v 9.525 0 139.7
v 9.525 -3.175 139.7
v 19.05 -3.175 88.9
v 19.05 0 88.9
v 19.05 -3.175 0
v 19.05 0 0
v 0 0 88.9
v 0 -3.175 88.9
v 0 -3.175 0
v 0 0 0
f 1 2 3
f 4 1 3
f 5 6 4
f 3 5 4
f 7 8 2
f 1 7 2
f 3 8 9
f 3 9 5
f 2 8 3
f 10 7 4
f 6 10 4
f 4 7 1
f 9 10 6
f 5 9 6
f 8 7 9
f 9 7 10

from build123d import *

# Parameters (mm, degrees)
F1_DEPTH = 3.175
F3_DEPTH = 25.4


# Not quite as in the source:
# - a length typed as a fraction of an inch, garbled in the dataset ("3 / 203.2 mm" for 3/8 in), is restored


with BuildPart() as f1:
    # F0 (on Front) → F1 (new body)
    with BuildSketch(Plane.XZ):
        Polygon((0, 88.9), (0, 0), (19.05, 0), (19.05, 88.9), (9.525, 139.7), align=None)
        Polygon((0, 139.7), (0, 88.9), (9.525, 139.7), align=None)
        Polygon((9.525, 139.7), (19.05, 88.9), (19.05, 139.7), align=None)
    extrude(amount=F1_DEPTH)

    # F2 (on face) → F3 (cut)
    with BuildSketch(Plane.XZ.offset(3.175)):
        Polygon((0, 139.7), (0, 88.9), (9.525, 139.7), align=None)
        Polygon((19.05, 139.7), (9.525, 139.7), (19.05, 88.9), align=None)
    extrude(amount=-F3_DEPTH, mode=Mode.SUBTRACT)


solid = f1.part
